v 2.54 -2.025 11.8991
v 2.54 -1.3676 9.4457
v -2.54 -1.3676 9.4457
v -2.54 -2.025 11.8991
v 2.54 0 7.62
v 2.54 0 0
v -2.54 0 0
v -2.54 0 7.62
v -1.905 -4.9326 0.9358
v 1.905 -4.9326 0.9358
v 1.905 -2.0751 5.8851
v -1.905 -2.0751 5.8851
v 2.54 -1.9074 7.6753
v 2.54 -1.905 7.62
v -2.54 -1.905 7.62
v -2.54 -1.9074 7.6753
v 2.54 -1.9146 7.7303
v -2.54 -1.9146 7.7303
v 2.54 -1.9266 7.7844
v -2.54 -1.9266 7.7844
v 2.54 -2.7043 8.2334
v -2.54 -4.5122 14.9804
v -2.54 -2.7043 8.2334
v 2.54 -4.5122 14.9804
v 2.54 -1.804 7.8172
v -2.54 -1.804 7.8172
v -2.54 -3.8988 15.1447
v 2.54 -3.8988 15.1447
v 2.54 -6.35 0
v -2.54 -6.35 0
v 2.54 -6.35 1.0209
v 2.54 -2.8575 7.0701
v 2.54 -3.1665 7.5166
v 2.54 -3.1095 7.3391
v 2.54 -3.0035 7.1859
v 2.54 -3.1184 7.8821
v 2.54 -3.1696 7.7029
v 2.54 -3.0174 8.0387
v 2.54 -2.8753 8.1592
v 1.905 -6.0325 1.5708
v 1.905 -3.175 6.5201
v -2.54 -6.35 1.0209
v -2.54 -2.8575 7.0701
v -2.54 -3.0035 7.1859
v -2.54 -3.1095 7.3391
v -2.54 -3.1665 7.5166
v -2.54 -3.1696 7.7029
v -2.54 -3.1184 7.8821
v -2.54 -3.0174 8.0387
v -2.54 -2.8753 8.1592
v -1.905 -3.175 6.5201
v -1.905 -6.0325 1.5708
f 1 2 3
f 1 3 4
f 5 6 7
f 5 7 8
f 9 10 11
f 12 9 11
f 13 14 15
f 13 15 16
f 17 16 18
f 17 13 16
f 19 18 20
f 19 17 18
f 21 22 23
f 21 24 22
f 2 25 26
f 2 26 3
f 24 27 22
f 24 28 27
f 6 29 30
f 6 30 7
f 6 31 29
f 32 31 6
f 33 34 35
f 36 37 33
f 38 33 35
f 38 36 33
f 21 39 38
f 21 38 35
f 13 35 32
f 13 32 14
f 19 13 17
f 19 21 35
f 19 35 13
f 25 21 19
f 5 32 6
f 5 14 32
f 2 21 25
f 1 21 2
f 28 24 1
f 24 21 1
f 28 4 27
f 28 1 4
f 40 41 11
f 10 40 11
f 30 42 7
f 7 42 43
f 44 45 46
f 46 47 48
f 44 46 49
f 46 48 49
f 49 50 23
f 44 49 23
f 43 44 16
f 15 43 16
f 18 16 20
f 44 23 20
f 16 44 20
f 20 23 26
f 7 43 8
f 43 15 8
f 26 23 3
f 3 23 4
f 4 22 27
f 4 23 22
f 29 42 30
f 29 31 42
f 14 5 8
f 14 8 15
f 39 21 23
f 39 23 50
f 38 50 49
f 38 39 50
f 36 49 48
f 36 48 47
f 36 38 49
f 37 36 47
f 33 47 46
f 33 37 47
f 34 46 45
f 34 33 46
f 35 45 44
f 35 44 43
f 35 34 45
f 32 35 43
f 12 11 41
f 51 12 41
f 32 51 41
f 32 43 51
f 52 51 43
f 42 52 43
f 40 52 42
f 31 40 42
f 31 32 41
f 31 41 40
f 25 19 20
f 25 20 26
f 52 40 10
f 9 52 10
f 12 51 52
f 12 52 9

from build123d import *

# Parameters (mm, degrees)
F1_DEPTH = 2.54
F3_DEPTH = 2.54
F5_DEPTH = 1.905


with BuildPart() as f1:
    # F0 (on Right) → F1 (new body, symmetric)
    with BuildSketch(Plane.YZ):
        Polygon((-6.35, 1.020886), (-6.35, 0), (0, 0), (0, 7.62), (-2.54, 7.62), align=None)
    extrude(amount=F1_DEPTH, both=True)

    # F2 (on Right) → F3 (join, symmetric)
    with BuildSketch(Plane.YZ):
        with BuildLine():
            Line((-4.512201, 14.980355), (-2.70435, 8.233363))
            ThreePointArc((-2.70435, 8.233363), (-2.8575, 7.070074), (-1.926637, 7.78435))
            Line((-1.926637, 7.78435), (-1.803965, 7.81722))
            Line((-1.803965, 7.81722), (-1.367615, 9.445697))
            Line((-1.367615, 9.445697), (-2.025016, 11.899149))
            Line((-2.025016, 11.899149), (-3.898838, 15.144705))
            Line((-3.898838, 15.144705), (-4.512201, 14.980355))
        make_face()
    extrude(amount=F3_DEPTH, both=True)

    # F4 (on Right) → F5 (cut, symmetric)
    with BuildSketch(Plane.YZ):
        Polygon((-3.734312, 6.843067), (-6.591812, 1.893732), (-4.932648, 0.935813), (-2.075148, 5.885148), align=None)
    extrude(amount=F5_DEPTH, both=True, mode=Mode.SUBTRACT)


solid = f1.part
